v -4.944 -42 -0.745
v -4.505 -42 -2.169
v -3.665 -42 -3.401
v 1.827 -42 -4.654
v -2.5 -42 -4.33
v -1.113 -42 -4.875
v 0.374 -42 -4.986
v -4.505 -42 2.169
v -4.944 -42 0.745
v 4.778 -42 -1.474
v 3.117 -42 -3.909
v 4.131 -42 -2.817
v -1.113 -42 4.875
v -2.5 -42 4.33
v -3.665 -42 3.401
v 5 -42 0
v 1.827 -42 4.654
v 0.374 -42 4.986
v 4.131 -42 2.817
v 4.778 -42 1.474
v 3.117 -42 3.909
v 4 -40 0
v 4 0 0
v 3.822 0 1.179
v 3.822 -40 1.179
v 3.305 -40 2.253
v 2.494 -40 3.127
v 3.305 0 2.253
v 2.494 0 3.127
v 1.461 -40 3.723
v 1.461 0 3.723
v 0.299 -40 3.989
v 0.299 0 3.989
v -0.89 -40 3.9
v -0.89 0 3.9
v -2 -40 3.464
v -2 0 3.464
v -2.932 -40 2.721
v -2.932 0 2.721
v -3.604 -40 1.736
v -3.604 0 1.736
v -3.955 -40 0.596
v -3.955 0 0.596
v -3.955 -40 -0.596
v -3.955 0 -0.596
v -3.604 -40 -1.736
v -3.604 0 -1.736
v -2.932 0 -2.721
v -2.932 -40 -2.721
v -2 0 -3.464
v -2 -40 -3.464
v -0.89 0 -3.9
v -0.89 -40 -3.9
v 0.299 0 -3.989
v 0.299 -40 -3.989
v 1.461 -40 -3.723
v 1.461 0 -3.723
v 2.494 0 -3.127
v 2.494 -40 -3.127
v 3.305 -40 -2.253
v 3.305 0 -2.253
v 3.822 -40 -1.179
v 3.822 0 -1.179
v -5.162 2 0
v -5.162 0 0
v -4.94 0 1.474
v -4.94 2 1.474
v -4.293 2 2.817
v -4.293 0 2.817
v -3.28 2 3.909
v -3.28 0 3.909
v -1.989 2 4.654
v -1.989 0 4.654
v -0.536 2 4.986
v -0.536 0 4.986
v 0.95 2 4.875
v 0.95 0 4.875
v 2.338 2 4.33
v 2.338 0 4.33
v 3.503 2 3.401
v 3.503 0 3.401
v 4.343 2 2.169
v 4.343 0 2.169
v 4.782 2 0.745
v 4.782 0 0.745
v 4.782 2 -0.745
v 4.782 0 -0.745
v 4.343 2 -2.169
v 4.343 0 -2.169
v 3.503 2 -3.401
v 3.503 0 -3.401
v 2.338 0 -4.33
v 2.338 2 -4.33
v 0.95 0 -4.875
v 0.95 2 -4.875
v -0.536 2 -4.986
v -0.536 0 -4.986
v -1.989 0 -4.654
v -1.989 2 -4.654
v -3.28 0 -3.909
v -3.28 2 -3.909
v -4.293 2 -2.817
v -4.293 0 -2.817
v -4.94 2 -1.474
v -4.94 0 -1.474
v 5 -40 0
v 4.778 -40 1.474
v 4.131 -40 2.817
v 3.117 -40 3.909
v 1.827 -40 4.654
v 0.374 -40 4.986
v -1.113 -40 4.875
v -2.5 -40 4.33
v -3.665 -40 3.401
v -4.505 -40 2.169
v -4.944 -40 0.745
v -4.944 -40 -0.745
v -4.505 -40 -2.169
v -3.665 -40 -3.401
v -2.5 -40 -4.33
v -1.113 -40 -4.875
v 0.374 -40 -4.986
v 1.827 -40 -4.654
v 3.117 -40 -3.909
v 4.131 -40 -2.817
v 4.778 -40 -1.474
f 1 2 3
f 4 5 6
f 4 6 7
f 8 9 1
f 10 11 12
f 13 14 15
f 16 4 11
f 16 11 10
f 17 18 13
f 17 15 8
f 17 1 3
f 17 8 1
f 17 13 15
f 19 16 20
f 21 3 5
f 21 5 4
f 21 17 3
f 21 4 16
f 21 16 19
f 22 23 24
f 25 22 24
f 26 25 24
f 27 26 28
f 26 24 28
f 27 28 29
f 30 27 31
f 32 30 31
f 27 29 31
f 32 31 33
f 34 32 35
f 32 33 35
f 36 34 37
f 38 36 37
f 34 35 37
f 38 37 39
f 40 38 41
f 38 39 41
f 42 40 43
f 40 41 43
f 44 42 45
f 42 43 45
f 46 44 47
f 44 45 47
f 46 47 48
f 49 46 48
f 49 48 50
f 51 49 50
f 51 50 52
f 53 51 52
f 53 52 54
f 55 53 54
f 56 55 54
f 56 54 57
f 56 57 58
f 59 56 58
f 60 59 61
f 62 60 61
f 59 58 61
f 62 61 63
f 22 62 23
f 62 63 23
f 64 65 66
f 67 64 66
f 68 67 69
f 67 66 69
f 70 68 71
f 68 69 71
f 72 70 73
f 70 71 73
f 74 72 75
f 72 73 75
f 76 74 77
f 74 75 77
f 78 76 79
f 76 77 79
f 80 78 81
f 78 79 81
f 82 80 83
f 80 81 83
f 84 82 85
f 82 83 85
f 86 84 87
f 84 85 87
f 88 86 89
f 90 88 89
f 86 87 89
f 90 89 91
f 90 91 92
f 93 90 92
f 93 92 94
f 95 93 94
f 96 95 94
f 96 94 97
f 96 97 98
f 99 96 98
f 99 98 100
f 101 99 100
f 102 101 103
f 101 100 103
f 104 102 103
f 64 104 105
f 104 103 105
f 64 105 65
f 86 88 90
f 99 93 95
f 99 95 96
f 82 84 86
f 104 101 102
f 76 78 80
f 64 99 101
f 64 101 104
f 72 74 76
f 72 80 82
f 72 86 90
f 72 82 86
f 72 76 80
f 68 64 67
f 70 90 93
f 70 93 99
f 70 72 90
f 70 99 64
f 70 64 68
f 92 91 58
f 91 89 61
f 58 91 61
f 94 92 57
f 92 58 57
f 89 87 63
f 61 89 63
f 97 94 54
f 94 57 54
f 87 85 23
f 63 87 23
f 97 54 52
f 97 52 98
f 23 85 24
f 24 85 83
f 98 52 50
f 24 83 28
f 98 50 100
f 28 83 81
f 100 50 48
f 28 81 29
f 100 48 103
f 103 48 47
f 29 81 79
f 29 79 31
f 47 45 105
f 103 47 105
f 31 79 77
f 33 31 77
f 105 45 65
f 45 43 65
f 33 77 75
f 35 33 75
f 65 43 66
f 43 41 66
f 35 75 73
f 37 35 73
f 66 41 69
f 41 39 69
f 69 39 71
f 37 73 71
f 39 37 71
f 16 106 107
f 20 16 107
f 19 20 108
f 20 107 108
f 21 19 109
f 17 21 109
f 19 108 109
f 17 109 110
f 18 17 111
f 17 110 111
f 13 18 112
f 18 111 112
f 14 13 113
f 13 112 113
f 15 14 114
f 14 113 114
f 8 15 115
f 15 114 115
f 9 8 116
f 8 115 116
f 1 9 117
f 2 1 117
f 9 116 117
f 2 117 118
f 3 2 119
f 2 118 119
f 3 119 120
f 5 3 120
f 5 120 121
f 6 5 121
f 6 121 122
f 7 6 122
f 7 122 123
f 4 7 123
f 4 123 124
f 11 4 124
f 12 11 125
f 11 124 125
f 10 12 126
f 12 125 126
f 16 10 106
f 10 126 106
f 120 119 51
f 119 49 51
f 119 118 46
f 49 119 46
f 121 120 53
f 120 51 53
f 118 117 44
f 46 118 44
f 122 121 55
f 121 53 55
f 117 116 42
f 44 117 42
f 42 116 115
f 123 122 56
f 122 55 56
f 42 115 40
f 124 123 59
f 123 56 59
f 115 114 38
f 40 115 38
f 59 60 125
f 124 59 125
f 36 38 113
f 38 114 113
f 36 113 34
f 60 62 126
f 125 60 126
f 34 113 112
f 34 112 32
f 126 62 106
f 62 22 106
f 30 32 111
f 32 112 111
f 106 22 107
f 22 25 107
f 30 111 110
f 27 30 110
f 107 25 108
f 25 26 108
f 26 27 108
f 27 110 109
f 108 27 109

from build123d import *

# Parameters (mm, degrees)
F0_R     = 4
F1_DEPTH = 40
F2_R     = 5
F2_R_2   = 4
F3_DEPTH = 2
F4_R     = 5
F4_R_2   = 4
F5_DEPTH = 2


with BuildPart() as f1:
    # F0 (on Front) → F1 (new body)
    with BuildSketch(Plane.XZ):
        Circle(F0_R)
    extrude(amount=F1_DEPTH)

    # F2 (on face) → F3 (join)
    with BuildSketch(Plane.XZ.offset(40)):
        Circle(F2_R)
        Circle(F2_R_2, mode=Mode.SUBTRACT)
        Circle(F2_R_2)
    extrude(amount=F3_DEPTH)

    # F4 (on face) → F5 (join)
    with BuildSketch(Plane(origin=(0, 0, 0), x_dir=(-1, 0, 0), z_dir=(0, 1, 0))):
        with Locations((0.1622709678, 0)):
            Circle(F4_R)
        Circle(F4_R_2, mode=Mode.SUBTRACT)
        Circle(F4_R_2)
    extrude(amount=F5_DEPTH)


solid = f1.part
